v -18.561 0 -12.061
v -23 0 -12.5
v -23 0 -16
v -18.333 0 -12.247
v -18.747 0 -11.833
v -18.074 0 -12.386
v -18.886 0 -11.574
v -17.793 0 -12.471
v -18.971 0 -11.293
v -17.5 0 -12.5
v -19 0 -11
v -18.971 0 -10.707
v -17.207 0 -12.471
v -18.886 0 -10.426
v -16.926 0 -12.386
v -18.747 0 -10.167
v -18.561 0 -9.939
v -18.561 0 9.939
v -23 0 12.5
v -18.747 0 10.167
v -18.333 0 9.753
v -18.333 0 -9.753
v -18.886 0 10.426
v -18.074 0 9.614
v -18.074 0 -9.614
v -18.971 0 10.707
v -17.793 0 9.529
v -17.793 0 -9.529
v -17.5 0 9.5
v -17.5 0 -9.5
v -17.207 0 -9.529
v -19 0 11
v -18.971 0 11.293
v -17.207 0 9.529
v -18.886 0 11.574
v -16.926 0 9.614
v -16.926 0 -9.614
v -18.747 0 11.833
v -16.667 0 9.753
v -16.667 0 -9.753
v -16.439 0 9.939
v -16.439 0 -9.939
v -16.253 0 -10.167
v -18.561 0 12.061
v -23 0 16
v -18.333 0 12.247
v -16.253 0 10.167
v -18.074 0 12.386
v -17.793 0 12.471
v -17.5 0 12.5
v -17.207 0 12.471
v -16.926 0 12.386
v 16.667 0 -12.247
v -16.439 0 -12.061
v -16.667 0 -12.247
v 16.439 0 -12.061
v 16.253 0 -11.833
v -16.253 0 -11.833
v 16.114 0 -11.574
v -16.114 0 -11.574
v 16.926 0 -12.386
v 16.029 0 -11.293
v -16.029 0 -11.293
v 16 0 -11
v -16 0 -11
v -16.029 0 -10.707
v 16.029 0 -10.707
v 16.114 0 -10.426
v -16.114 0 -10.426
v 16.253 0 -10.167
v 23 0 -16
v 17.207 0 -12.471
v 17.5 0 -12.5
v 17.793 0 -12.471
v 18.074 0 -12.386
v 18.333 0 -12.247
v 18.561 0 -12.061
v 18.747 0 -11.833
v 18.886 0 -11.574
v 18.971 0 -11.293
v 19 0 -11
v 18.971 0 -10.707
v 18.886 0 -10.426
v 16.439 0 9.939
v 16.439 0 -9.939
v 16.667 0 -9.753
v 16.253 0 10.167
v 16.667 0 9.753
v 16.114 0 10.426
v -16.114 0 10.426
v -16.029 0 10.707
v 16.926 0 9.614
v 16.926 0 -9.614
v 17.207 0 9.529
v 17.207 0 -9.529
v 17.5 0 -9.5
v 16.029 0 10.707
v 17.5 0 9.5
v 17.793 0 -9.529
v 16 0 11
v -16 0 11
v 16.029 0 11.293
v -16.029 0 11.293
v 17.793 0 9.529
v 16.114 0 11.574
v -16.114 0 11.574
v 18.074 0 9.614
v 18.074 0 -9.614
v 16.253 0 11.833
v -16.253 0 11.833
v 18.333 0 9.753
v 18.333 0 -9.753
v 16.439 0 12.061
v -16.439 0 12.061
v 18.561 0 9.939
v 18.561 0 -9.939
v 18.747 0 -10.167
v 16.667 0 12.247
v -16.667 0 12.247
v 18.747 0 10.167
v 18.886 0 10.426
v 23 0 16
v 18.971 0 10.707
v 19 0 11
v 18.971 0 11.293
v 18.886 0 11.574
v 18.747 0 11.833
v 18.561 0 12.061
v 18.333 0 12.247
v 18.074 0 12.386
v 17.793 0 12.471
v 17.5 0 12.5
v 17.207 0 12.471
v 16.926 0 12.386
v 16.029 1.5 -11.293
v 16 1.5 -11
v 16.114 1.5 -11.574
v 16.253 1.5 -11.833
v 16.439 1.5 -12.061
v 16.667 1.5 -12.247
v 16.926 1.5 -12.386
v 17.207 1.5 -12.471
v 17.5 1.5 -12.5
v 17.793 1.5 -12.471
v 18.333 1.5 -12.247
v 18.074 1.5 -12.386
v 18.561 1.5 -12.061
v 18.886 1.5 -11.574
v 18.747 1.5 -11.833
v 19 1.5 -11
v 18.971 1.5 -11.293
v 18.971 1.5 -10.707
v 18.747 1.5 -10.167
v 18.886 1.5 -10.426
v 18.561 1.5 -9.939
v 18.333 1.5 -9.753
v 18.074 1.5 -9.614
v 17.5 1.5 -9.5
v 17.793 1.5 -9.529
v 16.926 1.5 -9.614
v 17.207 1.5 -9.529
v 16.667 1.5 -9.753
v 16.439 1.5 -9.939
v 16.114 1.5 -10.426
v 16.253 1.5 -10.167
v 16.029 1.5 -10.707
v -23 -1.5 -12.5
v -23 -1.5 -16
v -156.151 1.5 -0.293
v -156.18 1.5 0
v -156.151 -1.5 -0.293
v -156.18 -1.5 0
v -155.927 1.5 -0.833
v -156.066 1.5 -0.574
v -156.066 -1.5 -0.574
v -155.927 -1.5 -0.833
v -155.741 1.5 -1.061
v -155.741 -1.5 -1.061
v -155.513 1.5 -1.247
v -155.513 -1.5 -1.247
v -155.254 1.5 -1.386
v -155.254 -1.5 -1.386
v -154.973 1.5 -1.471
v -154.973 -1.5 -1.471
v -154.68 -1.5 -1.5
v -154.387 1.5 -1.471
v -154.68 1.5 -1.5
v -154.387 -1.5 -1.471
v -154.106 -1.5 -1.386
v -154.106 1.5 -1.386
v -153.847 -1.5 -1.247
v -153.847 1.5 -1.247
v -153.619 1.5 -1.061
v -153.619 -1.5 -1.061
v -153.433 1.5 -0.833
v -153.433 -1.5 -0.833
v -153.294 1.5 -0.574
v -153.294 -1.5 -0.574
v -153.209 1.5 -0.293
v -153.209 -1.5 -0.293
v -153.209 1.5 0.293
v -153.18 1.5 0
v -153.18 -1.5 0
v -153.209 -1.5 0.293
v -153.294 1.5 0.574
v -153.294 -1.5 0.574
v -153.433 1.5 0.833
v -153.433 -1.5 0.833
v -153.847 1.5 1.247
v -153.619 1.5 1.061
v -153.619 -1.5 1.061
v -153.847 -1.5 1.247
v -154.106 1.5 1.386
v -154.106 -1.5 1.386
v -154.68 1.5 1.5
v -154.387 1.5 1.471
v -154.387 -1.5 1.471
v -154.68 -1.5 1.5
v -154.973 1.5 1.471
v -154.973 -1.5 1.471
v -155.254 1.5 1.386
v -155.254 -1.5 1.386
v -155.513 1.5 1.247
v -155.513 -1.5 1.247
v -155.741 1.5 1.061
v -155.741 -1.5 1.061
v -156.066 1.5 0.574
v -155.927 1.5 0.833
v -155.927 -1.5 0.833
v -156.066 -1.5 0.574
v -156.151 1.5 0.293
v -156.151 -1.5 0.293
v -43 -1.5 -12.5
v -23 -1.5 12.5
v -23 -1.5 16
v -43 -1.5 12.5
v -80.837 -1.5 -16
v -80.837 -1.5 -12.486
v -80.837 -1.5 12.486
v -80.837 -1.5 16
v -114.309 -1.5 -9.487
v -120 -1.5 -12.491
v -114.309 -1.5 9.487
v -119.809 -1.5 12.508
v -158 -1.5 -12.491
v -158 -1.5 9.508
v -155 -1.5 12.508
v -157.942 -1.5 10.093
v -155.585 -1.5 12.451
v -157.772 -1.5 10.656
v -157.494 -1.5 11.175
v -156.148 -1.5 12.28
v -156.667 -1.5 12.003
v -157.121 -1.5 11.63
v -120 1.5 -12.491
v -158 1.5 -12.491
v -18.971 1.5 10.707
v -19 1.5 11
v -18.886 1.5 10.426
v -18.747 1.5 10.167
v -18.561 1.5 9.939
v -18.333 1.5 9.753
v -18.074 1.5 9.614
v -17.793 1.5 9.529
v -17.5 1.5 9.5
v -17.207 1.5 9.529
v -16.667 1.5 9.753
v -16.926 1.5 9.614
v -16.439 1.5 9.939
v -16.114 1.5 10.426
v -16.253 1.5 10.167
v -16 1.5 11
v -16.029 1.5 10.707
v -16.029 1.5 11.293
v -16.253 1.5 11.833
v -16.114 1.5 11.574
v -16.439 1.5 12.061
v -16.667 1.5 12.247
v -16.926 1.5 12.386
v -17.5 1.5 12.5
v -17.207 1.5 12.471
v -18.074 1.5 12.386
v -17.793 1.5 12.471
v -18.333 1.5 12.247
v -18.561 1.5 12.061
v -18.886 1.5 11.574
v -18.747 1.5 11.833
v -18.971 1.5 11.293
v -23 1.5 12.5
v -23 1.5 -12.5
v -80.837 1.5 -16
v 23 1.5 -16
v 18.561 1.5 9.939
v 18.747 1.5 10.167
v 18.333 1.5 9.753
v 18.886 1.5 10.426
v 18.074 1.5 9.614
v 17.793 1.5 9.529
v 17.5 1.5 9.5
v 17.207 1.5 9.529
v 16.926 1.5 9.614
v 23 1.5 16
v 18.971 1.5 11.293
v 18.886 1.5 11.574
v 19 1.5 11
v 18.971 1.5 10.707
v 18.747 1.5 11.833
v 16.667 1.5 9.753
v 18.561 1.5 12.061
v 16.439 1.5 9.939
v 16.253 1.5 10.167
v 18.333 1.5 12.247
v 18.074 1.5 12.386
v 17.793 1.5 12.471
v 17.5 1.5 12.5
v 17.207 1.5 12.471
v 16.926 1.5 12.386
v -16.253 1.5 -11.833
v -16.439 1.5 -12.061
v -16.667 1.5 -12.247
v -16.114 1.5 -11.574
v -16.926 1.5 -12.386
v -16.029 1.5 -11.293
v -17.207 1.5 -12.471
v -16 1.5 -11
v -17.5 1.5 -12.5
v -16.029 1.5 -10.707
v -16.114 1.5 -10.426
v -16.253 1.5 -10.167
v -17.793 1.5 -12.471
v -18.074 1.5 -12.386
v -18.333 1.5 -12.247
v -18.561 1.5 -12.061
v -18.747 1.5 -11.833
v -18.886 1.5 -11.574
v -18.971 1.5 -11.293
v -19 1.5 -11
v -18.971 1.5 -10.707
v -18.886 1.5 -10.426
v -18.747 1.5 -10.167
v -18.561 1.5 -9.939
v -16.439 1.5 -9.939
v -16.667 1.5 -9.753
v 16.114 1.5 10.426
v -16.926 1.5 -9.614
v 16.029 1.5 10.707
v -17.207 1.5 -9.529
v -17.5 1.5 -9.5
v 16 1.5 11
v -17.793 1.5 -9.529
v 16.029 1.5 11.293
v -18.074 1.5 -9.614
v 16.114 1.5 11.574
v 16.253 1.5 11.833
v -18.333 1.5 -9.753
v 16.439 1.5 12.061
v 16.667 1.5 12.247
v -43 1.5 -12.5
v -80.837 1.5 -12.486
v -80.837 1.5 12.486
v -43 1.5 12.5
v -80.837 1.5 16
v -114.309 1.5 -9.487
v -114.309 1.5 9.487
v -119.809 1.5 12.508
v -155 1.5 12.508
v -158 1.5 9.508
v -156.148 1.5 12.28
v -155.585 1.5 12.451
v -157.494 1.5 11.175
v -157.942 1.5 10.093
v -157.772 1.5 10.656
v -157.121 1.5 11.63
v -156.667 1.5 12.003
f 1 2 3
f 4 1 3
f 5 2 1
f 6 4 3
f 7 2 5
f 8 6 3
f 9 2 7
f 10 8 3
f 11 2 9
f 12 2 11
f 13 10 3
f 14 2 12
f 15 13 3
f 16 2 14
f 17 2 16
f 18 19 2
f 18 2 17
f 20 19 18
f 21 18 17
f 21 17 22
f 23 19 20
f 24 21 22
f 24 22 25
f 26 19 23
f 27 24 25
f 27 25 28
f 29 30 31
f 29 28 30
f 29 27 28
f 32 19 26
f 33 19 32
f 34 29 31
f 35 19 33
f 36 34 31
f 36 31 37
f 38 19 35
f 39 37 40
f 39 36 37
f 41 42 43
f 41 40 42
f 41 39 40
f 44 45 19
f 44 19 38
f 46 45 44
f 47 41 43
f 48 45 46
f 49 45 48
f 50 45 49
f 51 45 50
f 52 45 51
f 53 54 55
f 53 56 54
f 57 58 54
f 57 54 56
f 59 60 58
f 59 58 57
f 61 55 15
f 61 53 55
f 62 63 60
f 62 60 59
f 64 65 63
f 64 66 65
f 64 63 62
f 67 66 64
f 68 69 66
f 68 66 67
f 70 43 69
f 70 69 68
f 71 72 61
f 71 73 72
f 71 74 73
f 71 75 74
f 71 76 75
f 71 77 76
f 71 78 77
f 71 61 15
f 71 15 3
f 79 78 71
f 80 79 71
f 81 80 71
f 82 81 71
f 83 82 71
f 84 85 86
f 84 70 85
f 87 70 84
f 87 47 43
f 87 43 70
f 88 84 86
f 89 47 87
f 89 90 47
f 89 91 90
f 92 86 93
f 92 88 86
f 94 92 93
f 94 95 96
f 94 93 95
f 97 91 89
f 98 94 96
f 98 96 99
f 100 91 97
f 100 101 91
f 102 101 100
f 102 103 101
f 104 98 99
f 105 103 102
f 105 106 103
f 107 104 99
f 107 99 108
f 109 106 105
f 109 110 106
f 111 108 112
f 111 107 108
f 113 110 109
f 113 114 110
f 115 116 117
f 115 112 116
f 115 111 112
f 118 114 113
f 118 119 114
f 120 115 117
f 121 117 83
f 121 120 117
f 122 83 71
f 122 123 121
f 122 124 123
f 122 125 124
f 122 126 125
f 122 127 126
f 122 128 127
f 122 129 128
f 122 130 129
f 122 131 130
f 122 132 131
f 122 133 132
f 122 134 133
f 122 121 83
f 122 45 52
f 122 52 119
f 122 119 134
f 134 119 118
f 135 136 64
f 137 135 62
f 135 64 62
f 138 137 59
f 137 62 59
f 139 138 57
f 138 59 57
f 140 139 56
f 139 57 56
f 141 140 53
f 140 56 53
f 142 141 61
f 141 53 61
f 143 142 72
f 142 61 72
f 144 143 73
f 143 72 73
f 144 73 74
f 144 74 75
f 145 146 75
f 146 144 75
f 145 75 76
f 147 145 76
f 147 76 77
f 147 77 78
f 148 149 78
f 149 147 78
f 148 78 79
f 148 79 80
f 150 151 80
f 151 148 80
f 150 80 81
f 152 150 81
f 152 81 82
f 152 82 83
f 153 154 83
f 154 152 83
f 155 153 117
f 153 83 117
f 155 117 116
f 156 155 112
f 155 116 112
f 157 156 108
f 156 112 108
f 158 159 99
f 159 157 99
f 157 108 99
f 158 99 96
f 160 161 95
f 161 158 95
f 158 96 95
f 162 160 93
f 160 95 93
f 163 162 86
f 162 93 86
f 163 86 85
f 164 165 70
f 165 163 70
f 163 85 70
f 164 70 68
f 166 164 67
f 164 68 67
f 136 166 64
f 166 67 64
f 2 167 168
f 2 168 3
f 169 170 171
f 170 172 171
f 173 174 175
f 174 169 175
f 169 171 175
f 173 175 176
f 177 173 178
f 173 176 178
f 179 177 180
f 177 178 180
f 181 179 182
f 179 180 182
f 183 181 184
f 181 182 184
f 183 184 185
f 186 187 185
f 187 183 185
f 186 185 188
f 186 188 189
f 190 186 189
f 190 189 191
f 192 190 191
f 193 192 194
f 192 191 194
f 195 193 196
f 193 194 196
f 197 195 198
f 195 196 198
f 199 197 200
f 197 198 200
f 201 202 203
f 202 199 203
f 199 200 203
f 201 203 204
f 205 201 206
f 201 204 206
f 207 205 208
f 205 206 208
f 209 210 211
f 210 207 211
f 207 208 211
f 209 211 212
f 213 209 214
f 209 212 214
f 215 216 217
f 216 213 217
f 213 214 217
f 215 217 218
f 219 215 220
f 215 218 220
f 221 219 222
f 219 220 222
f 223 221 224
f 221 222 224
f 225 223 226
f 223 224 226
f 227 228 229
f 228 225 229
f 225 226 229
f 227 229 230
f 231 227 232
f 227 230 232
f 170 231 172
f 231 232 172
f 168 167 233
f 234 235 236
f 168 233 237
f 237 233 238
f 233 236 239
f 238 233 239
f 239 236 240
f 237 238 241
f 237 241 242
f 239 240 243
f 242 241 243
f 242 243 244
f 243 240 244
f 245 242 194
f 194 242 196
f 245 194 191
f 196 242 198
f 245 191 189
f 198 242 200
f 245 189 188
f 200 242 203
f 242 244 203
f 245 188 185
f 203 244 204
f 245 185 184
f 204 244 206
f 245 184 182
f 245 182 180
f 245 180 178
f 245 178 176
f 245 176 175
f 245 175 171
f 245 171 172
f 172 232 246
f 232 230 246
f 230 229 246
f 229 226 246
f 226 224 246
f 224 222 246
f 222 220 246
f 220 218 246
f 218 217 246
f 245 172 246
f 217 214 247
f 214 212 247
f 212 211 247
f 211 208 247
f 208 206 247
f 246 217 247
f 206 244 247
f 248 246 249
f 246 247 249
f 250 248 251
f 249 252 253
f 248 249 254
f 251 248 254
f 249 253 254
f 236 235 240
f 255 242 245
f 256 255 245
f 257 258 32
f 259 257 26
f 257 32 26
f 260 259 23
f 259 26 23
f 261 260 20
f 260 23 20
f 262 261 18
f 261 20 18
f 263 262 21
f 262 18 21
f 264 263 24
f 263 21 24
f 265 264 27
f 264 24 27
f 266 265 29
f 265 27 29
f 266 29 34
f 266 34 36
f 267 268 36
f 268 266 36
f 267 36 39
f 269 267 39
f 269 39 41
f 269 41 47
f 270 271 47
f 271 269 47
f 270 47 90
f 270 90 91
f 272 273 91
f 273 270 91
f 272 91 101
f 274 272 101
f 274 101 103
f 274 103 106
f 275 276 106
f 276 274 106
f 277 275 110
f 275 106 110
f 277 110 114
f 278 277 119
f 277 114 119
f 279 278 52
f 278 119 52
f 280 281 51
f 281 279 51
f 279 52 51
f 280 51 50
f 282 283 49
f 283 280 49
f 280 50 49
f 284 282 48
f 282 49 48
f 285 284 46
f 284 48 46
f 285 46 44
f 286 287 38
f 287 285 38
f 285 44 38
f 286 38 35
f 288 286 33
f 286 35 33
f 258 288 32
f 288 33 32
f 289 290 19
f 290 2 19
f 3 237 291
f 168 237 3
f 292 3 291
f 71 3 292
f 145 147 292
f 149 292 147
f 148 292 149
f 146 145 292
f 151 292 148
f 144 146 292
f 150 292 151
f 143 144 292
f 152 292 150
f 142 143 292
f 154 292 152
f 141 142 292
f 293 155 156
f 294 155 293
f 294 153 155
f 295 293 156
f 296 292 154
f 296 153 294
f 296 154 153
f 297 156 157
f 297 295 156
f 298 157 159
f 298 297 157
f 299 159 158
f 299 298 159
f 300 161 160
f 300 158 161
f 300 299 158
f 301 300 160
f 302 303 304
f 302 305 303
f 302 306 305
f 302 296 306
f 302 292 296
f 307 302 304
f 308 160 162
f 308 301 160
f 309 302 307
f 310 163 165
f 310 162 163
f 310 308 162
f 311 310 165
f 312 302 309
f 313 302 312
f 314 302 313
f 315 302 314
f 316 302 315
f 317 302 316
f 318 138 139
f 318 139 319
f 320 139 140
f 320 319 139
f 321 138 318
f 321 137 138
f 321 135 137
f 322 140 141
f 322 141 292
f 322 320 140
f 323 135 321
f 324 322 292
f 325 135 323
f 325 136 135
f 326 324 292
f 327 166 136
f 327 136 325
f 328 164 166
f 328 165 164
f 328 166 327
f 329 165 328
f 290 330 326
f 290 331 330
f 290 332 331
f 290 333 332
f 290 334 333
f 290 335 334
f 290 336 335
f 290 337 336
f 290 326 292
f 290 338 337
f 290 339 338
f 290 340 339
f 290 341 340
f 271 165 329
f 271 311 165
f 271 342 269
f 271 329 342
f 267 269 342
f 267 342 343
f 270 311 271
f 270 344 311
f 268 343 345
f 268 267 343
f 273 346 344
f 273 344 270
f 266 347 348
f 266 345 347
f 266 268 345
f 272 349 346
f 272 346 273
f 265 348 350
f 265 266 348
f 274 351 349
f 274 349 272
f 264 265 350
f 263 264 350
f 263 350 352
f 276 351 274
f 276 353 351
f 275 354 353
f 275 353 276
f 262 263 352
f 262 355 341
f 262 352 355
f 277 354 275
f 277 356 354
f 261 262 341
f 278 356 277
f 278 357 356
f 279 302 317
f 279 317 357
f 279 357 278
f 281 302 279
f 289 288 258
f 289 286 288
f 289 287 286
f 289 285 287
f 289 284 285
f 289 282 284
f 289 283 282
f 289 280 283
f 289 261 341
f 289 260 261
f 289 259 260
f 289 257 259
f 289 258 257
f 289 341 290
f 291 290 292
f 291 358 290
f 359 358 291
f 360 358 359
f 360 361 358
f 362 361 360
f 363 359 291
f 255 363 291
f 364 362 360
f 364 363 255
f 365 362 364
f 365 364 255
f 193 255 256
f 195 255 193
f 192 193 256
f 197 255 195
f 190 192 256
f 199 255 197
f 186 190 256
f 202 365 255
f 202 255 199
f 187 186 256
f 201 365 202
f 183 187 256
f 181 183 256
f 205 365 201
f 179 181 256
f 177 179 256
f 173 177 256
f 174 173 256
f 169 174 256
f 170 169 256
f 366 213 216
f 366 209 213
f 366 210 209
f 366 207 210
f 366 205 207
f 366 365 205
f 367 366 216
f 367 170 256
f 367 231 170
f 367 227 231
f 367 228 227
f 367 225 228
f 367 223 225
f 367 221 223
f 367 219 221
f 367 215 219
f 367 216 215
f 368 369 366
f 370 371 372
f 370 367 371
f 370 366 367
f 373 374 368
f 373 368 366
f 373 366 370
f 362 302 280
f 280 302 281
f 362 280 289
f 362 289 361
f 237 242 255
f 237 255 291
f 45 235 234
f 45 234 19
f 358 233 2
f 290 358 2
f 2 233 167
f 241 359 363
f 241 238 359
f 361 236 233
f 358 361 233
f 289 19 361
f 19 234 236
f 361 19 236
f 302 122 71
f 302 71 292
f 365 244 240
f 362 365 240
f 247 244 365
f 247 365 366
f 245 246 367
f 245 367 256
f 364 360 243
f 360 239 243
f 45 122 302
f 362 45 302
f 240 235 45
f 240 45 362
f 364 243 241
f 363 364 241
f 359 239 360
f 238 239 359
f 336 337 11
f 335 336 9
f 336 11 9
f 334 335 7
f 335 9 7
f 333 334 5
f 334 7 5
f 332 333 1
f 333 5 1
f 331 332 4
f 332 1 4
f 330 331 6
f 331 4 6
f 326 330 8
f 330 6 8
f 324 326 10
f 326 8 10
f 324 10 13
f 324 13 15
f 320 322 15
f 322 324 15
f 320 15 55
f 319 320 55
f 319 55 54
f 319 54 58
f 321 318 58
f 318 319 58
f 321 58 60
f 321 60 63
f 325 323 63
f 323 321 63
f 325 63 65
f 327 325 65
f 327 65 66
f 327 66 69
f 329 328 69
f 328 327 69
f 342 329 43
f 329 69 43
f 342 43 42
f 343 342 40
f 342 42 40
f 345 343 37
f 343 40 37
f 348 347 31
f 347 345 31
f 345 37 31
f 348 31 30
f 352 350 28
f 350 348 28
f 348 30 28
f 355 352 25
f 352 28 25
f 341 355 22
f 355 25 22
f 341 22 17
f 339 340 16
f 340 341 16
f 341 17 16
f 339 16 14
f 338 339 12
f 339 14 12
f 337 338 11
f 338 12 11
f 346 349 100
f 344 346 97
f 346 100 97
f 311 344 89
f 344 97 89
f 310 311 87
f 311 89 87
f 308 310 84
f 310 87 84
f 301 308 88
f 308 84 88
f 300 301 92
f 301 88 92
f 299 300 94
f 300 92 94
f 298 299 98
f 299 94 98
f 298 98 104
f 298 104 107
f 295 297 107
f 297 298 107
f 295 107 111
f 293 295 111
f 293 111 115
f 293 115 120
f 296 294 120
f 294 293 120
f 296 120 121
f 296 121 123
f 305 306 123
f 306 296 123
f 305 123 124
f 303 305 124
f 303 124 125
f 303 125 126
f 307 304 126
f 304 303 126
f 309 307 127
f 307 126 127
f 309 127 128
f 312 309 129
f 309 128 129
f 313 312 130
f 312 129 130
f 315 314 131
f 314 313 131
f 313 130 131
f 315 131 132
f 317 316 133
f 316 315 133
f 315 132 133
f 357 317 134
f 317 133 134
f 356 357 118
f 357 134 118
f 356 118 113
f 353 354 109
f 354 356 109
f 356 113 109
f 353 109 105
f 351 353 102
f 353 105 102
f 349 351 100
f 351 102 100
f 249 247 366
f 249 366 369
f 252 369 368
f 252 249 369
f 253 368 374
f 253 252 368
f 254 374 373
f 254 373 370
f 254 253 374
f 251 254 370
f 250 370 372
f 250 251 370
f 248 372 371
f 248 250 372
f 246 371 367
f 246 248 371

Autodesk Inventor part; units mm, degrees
ref_plane "YZ Plane" through (0, 0, 0) normal (1, 0, 0) x (0, 1, 0)
ref_plane "XZ Plane" through (0, 0, 0) normal (0, 1, 0) x (-1, 0, 0)
ref_plane "XY Plane" through (0, 0, 0) normal (0, 0, 1) x (1, 0, 0)
sketch "Sketch1" plane through (0, 0, 0) normal (0, 1, 0) x (-1, 0, 0)
  line L0 (-119.8086, 12.5082) -> (-80.837, 16)
  line L1 (-80.837, 16) -> (0, 16)
  line L2 (-120, 0) -> (120, 0) construction
  line L3 (-120, -12.4911) -> (-80.837, -16)
  line L4 (-80.837, -16) -> (0, -16)
  line L5 (0, 16) -> (0, -16) construction
  line L6 (80.837, 16) -> (0, 16)
  line L7 (119.8086, 12.5082) -> (80.837, 16)
  line L8 (120, -12.4911) -> (80.837, -16)
  line L9 (80.837, -16) -> (0, -16)
  line L10 (-80.837, -12.486) -> (-114.3086, -9.487)
  line L11 (-80.837, 12.486) -> (-114.3086, 9.487)
  line L12 (-114.3086, 9.487) -> (-114.3086, -9.487)
  line L13 (-80.837, 12.486) -> (-80.837, -12.486)
  line L14 (-23, 12.5) -> (-43, 12.5)
  line L15 (-43, 12.5) -> (-43, -12.5)
  line L16 (-43, -12.5) -> (-23, -12.5)
  line L17 (-23, -12.5) -> (-23, 12.5)
  line L18 (80.837, -12.486) -> (114.3086, -9.487)
  line L19 (80.837, 12.486) -> (114.3086, 9.487)
  line L20 (114.3086, 9.487) -> (114.3086, -9.487)
  line L21 (80.837, 12.486) -> (80.837, -12.486)
  line L22 (23, 12.5) -> (43, 12.5)
  line L23 (43, 12.5) -> (43, -12.5)
  line L24 (43, -12.5) -> (23, -12.5)
  line L25 (23, -12.5) -> (23, 12.5)
  circle A0 centre (-17.5, -11) radius 1.5
  circle A1 centre (17.5, -11) radius 1.5
  circle A2 centre (-17.5, 11) radius 1.5
  circle A3 centre (17.5, 11) radius 1.5
  line L26 (-119.8086, 12.5082) -> (-158, 12.5082)
  line L27 (-158, 12.5082) -> (-158, -12.4911)
  line L28 (-120, -12.4911) -> (-158, -12.4911)
  circle A4 centre (-154.68, 0) radius 1.5
  line L29 (119.8086, 12.5082) -> (158, 12.5082)
  line L30 (158, 12.5082) -> (158, -12.4911)
  line L31 (120, -12.4911) -> (158, -12.4911)
  circle A5 centre (154.68, 0) radius 1.5
  point P0 (0, 0)
  point P1 (0, 0)
  point P2 (0, 0)
  point P3 (-114.3086, 0)
  point P4 (-33, 12.5)
  dimension "d0" = 25
  dimension "d2" = 80.837
  dimension "d6" = 3.5
  dimension "d9" = 3.5
  dimension "d10" = 3.5
  dimension "d11" = 20
  dimension "d13" = 3
  dimension "d14" = 5
  dimension "d15" = 5.5
  dimension "d17" = 38
  dimension "d18" = 39.163
  dimension "d19" = 5.5
  dimension "d23" = 3
  dimension "d24" = 3.32
  dimension "d30" = 32
  dimension "d33" = 23
  dimension "d34" = 3.5089
extrude "Extrusion1" add sketch "Sketch1" along normal mid plane 3
fillet "Fillet1" radius 3 2 edges at (-158, 0, 12.5082) (158, 0, 12.5082)
sketch "Sketch3" plane through (-80.837, 1.5, 16) normal (0, 0, 1) x (1, 0, 0)
  line L0 (0, 0) -> (161.674, 0) projected
  line L1 (161.674, -3) -> (0, -3) projected
  line L2 (57.837, -3) -> (57.837, 0) projected
  line L3 (103.837, -3) -> (103.837, 0) projected
  line L4 (57.837, -3) -> (57.837, 0) projected
  line L5 (57.837, -1.5) -> (103.837, -1.5)
  line L6 (238.837, -3) -> (238.837, 0) projected
  line L7 (200.6456, 0) -> (235.837, 0) projected
  line L8 (235.837, 0) -> (238.837, 0) projected
  line L9 (238.837, -3) -> (235.837, -3) projected
  line L10 (235.837, -3) -> (200.6456, -3) projected
  line L11 (200.6456, -3) -> (161.674, -3) projected
  line L12 (161.674, 0) -> (200.6456, 0) projected
  point P0 (80.837, -1.5)
extrude "Extrusion2" cut sketch "Sketch3" against normal through all contours L0 L12 L7 L8 L6 L9 L10 L11 L1 L3 | L5 L3 L1 L2
properties part number "nakladka" material "PCTG 20%"
